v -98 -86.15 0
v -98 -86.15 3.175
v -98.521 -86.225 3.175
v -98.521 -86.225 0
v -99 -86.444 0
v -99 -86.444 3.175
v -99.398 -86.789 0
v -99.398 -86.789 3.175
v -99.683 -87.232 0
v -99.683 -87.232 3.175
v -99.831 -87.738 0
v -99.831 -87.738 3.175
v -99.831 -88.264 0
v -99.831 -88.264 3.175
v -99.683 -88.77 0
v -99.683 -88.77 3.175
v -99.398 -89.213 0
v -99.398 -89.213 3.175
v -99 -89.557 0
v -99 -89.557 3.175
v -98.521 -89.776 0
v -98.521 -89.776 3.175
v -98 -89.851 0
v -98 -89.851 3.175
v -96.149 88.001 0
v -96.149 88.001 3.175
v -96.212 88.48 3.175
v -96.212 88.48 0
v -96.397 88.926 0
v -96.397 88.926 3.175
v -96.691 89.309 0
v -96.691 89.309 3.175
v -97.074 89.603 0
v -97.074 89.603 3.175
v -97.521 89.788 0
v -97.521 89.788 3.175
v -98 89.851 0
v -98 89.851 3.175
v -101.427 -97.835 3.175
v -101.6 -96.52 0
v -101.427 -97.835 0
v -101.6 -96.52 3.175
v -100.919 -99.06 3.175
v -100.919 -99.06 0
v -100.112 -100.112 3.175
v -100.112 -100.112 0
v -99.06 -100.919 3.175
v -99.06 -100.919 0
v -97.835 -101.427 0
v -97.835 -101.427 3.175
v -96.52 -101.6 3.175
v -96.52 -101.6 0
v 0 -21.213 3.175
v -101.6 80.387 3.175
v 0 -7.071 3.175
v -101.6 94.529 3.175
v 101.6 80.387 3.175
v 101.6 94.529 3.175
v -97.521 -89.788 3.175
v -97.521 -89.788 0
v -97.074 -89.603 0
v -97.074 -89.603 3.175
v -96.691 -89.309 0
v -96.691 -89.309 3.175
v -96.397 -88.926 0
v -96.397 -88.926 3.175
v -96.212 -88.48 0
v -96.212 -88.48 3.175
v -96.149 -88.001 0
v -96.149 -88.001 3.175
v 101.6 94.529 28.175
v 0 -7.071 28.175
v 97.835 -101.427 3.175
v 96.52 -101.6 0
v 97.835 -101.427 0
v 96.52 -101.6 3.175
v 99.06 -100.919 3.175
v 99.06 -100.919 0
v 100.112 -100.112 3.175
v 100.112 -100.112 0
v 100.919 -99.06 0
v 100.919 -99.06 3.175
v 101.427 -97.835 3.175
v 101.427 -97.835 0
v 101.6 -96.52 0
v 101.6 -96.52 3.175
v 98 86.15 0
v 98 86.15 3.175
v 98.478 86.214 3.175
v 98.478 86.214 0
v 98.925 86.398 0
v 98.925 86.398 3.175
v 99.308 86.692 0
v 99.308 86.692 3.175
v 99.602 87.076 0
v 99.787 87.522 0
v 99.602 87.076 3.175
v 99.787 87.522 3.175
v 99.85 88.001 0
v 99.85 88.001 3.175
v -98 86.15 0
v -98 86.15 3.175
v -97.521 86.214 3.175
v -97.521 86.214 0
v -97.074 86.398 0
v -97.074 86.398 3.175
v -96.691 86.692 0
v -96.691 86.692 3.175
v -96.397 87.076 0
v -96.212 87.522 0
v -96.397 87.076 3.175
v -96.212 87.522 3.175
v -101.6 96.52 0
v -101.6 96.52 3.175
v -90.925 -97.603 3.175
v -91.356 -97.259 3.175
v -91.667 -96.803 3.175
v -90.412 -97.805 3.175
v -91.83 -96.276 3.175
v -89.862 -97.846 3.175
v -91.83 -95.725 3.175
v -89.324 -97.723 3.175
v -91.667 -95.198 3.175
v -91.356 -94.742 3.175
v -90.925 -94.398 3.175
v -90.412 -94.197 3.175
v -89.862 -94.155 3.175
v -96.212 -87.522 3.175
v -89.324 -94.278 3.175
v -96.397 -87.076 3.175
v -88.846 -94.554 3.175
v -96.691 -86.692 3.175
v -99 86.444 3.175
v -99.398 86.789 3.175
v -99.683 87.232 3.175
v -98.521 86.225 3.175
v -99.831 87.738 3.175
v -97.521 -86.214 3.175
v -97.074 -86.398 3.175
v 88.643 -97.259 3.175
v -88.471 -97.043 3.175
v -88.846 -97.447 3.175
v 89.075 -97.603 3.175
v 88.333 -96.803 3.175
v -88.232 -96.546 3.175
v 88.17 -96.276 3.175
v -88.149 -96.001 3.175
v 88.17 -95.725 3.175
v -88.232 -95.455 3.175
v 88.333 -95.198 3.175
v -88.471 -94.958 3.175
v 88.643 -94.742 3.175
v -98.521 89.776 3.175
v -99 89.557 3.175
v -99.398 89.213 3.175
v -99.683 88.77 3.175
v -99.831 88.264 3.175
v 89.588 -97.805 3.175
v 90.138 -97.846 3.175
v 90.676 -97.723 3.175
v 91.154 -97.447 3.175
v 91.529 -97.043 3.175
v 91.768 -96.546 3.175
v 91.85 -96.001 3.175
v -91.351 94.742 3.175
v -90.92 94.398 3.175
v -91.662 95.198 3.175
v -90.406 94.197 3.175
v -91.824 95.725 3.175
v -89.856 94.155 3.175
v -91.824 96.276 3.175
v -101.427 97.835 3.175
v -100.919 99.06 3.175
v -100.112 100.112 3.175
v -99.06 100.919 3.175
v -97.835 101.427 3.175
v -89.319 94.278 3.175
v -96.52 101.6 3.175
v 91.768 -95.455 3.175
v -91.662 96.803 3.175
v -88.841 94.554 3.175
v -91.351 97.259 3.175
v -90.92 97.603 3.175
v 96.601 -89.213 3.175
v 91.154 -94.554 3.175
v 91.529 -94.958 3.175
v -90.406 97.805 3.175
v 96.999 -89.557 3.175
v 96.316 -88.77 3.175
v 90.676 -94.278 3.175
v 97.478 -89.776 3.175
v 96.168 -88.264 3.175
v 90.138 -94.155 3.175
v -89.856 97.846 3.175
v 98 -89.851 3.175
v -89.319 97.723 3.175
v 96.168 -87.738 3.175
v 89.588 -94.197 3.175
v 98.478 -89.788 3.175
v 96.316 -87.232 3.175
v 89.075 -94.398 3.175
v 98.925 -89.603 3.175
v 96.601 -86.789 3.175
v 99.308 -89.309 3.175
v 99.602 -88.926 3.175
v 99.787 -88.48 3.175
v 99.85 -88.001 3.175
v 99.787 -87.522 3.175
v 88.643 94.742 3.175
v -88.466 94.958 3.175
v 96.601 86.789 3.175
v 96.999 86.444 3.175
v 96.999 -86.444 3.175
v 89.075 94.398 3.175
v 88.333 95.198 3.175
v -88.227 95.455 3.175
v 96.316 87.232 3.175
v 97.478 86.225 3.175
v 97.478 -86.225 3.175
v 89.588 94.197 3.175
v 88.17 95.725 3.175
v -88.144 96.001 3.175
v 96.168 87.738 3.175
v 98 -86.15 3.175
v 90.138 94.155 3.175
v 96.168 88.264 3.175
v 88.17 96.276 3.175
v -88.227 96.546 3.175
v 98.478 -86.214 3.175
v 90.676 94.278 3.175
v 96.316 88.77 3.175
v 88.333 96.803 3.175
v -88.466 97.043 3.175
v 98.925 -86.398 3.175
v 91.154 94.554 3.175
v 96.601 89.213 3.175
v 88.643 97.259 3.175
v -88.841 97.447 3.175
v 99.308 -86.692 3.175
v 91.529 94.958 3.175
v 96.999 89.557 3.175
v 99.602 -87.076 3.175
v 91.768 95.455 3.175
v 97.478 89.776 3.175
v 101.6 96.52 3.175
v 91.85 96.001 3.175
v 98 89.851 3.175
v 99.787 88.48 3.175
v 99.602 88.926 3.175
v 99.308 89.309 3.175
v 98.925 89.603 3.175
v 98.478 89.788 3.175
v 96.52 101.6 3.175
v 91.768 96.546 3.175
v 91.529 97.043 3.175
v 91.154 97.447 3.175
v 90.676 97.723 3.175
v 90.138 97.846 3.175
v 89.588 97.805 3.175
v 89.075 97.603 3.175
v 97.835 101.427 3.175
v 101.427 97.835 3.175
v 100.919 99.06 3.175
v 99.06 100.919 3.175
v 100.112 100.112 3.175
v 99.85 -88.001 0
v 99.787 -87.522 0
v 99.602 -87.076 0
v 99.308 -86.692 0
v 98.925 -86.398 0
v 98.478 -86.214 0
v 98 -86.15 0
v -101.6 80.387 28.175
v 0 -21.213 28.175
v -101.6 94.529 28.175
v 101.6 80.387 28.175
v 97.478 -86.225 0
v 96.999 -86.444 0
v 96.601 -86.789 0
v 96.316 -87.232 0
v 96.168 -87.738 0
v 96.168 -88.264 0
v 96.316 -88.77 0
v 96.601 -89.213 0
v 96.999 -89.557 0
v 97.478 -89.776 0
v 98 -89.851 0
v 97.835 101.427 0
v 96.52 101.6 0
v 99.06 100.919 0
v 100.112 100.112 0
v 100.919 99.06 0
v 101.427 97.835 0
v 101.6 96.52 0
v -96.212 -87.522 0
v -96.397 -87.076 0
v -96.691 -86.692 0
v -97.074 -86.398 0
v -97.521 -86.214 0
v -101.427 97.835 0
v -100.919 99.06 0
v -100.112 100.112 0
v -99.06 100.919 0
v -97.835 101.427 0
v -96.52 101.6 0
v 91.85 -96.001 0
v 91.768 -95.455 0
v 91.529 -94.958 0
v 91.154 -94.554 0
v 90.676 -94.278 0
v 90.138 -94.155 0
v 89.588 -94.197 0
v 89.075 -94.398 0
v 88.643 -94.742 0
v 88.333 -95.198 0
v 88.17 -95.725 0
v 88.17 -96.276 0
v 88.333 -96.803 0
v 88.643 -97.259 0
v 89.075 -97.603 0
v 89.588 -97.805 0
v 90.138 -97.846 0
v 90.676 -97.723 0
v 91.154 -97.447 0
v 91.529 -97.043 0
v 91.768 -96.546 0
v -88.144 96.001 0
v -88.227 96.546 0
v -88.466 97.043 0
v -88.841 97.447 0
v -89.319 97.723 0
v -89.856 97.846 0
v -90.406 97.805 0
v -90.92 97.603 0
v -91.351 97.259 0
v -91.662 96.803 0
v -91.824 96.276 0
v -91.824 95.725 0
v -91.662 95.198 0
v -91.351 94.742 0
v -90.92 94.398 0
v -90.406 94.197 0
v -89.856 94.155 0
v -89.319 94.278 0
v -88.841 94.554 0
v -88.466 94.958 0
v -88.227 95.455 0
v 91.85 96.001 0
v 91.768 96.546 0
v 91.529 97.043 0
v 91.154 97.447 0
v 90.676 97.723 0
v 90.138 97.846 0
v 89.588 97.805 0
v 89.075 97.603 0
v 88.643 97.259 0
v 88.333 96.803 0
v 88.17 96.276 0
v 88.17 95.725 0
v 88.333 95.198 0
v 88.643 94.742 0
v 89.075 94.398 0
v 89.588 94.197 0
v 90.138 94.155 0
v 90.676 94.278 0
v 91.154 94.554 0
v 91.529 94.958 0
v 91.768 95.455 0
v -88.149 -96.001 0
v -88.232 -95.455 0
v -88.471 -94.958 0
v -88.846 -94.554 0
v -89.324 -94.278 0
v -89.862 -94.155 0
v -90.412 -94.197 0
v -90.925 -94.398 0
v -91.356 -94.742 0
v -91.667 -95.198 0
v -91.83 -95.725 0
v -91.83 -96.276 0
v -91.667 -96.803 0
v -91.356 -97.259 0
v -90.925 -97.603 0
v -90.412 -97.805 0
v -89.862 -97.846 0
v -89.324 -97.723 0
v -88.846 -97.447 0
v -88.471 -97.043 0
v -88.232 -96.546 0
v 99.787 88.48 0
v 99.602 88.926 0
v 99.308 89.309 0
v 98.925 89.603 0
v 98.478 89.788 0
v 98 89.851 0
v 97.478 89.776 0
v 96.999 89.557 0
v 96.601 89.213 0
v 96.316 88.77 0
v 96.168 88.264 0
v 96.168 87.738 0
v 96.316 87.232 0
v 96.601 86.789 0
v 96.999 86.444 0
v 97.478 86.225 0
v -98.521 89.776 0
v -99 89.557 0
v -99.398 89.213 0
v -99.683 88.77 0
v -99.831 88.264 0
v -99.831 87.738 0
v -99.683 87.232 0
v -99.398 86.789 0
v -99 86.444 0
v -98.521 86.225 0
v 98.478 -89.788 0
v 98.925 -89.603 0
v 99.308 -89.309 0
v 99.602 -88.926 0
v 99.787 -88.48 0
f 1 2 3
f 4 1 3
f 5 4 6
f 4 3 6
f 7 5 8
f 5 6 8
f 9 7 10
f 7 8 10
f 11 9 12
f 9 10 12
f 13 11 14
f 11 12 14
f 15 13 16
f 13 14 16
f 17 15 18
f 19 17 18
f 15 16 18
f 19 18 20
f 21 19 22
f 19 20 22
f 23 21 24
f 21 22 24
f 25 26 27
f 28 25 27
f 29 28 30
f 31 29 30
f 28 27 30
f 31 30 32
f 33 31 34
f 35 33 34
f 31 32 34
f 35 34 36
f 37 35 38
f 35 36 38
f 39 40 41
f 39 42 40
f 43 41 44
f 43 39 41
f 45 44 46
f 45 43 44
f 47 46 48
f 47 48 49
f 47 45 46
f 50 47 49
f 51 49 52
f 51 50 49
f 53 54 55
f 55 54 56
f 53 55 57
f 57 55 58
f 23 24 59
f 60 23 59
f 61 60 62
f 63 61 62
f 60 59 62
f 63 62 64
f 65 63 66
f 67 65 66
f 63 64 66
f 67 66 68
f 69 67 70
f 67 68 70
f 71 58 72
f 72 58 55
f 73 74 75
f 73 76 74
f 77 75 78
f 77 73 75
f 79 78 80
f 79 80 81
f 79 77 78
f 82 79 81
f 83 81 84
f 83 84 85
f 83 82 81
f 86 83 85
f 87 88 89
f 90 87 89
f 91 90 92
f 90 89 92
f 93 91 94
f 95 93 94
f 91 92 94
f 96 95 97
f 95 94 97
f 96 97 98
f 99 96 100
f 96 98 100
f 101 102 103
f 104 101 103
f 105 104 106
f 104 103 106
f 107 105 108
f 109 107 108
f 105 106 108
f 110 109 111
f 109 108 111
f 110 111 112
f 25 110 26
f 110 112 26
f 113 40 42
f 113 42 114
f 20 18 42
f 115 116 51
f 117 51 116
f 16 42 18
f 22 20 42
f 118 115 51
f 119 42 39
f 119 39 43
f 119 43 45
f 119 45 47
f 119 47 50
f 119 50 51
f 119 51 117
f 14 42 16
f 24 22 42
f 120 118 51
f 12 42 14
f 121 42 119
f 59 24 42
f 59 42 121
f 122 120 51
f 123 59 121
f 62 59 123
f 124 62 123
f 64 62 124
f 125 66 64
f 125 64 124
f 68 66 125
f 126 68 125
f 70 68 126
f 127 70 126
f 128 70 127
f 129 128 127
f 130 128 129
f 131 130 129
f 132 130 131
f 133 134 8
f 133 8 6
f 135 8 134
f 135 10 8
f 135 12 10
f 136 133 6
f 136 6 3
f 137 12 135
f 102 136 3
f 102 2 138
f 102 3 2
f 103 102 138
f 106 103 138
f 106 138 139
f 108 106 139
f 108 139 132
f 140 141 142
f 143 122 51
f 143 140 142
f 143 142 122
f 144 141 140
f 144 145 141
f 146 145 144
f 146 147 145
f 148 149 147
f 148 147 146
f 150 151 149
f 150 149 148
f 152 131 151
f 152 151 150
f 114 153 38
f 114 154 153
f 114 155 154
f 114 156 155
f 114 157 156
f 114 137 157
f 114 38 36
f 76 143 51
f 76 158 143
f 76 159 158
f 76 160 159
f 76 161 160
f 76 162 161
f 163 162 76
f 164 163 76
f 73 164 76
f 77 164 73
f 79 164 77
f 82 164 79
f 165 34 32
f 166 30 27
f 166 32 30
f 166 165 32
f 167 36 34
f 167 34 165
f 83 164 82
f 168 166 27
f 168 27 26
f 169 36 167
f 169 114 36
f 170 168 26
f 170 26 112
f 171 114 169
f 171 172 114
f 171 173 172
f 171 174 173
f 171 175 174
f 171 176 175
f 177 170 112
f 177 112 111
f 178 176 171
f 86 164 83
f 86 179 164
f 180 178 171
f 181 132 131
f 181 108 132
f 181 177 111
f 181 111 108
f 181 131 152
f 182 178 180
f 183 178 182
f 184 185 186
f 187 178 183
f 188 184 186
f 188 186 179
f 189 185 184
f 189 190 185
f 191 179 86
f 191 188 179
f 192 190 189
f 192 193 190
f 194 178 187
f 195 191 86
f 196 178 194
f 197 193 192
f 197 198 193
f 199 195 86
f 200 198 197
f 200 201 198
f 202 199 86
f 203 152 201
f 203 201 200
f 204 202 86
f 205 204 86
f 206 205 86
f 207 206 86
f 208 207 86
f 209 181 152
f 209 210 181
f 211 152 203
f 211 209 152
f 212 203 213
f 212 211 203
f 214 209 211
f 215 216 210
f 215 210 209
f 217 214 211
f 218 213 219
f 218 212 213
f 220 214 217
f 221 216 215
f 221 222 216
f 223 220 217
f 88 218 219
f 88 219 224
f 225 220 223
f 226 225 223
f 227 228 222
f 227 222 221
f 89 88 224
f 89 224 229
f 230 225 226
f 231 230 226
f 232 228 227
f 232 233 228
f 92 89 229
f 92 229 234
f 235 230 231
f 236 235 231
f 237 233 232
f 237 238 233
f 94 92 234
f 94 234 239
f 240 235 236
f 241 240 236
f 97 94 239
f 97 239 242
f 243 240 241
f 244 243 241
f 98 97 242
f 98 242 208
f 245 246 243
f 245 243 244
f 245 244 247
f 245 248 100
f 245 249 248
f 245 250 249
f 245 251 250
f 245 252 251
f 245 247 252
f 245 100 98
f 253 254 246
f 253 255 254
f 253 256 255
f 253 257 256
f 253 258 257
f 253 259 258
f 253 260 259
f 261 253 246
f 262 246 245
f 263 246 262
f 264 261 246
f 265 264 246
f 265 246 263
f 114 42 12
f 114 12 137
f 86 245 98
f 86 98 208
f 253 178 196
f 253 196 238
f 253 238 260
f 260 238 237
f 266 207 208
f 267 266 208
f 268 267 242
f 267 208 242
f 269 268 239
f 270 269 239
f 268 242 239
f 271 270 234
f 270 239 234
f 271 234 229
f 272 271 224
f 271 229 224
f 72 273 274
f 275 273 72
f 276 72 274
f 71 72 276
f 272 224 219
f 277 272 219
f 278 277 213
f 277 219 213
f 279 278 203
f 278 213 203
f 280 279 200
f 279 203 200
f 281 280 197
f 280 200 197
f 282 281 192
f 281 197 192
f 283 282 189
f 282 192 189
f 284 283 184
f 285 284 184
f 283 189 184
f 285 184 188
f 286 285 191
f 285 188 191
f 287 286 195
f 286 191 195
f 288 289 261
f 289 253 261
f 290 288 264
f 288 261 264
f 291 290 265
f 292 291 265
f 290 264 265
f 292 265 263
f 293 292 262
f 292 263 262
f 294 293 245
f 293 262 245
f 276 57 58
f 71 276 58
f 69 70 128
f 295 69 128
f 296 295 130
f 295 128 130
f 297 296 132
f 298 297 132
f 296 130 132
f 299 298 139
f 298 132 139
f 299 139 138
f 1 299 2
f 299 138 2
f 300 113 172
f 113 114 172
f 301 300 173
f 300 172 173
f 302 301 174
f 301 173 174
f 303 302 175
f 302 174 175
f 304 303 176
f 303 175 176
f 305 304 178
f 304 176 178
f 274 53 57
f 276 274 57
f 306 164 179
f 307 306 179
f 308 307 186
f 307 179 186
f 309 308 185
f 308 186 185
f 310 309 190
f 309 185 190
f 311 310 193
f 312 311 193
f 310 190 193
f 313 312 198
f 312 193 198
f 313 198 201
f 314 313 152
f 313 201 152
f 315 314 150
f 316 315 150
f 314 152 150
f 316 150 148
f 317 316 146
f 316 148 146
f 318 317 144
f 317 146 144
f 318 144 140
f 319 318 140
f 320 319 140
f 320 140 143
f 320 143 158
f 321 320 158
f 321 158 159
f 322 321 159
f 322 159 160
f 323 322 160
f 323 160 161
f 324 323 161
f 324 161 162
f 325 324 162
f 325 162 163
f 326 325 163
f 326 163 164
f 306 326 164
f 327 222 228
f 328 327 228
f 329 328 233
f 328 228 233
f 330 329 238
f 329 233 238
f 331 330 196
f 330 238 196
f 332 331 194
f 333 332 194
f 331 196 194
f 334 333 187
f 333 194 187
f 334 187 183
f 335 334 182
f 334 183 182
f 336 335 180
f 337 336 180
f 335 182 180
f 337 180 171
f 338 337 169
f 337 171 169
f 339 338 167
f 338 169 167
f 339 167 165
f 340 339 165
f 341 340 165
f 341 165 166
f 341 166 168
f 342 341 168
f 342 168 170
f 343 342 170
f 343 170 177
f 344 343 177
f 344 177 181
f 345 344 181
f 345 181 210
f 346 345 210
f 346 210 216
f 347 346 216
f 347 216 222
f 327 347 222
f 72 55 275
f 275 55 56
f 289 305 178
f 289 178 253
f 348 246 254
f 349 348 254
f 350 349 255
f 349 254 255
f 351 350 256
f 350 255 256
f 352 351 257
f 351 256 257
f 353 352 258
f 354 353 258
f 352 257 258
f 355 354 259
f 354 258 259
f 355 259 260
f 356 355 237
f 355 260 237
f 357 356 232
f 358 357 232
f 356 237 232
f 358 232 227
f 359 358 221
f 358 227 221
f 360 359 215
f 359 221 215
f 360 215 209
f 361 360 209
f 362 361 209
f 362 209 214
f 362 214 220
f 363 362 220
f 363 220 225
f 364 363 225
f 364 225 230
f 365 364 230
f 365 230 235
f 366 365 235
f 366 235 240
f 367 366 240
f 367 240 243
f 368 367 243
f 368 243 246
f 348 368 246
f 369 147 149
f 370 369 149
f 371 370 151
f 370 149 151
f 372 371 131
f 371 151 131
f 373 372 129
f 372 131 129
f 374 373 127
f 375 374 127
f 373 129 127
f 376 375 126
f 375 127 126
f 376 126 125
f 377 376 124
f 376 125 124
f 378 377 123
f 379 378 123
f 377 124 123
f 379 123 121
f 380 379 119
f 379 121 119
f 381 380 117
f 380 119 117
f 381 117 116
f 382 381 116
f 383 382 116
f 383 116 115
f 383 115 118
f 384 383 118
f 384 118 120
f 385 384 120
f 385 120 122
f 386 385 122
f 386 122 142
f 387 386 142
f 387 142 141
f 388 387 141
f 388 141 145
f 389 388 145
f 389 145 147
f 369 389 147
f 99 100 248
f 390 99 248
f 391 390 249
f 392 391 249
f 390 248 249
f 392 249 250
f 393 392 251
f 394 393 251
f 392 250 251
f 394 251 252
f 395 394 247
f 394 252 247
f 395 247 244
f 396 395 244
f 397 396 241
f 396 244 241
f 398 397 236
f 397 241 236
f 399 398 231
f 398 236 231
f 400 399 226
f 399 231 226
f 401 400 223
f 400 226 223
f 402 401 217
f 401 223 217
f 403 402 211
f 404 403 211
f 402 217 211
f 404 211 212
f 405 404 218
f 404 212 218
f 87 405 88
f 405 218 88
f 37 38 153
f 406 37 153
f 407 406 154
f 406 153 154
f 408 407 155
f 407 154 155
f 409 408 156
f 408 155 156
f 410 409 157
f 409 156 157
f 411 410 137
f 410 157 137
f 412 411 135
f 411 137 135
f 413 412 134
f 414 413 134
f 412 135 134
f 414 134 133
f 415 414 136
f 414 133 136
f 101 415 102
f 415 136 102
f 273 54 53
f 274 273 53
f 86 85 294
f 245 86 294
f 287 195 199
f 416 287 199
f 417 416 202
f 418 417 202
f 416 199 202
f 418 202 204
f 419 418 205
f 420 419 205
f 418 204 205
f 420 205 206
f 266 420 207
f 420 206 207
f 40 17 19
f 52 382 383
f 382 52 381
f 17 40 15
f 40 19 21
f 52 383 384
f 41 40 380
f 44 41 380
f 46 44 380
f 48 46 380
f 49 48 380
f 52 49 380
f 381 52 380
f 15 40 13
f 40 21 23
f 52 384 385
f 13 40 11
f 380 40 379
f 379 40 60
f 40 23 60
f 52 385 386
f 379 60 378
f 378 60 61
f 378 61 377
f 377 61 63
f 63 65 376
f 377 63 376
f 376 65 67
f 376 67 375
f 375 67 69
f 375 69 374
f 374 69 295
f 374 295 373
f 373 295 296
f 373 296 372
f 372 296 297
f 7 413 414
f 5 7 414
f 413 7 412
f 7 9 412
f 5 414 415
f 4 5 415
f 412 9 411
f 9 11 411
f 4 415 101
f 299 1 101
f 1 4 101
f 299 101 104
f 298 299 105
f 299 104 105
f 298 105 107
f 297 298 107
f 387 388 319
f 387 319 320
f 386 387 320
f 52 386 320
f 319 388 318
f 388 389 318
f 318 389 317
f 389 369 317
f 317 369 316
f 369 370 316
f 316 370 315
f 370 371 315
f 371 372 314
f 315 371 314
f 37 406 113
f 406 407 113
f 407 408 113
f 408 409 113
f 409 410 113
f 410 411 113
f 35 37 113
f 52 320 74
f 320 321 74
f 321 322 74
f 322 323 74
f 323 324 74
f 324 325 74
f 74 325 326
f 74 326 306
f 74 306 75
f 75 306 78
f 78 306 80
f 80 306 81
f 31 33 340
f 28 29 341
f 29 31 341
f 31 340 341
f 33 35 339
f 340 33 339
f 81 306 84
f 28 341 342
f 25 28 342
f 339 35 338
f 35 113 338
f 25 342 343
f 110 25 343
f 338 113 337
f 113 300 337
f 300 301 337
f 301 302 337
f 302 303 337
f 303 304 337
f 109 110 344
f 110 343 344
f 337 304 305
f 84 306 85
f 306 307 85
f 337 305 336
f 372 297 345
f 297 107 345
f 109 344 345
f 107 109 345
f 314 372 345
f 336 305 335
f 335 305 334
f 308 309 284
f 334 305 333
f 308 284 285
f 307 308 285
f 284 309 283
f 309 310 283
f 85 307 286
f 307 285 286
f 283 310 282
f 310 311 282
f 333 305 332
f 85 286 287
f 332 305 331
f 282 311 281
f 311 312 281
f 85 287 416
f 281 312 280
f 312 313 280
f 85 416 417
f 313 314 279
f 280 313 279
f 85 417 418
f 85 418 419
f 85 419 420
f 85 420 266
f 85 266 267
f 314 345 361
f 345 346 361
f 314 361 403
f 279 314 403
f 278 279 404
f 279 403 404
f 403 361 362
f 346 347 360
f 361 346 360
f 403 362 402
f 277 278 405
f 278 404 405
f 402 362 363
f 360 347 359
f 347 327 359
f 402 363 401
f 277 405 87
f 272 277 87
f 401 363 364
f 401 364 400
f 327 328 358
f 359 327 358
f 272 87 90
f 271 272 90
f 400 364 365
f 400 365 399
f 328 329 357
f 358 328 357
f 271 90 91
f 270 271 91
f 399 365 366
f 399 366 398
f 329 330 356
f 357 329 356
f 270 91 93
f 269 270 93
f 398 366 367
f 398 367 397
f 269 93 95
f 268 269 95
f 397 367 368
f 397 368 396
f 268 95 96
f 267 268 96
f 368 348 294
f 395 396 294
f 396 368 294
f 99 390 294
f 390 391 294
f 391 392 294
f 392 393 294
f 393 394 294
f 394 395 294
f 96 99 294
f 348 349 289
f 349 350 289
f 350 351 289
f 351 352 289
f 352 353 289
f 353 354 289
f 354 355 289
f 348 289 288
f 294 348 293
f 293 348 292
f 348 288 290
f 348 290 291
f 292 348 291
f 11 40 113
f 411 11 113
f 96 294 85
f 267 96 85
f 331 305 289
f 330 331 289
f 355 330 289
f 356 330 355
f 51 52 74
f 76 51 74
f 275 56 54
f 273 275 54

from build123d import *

# Parameters (mm, degrees)
F0_W     = 203.2
F0_H     = 203.2
F1_DEPTH = 3.175
F2_R     = 1.85039
F3_DEPTH = 25.4
F4_R     = 5.08
F5_R     = 5.08
F7_DEPTH = 25


with BuildPart() as f1:
    # F0 (on Top) → F1 (new body)
    with BuildSketch(Plane.XY):
        Rectangle(F0_W, F0_H)
    extrude(amount=F1_DEPTH)

    # F2 (on face) → F3 (cut)
    with BuildSketch(Plane.XY.offset(3.175)):
        with BuildLine():
            ThreePointArc((97.99955, 89.85123), (96.14916, 88.00084), (97.99955, 86.15045))
            Line((97.99955, 86.15045), (97.99955, 89.85123))
        make_face()
        with BuildLine():
            Line((97.99955, 89.85123), (97.99955, 86.15045))
            ThreePointArc((97.99955, 86.15045), (99.307973, 86.692417), (99.84994, 88.00084))
            ThreePointArc((99.84994, 88.00084), (99.307973, 89.309263), (97.99955, 89.85123))
        make_face()
        with BuildLine():
            ThreePointArc((99.84994, -88.00084), (99.307973, -86.692417), (97.99955, -86.15045))
            Line((97.99955, -86.15045), (97.99955, -89.85123))
            ThreePointArc((97.99955, -89.85123), (99.307973, -89.309263), (99.84994, -88.00084))
        make_face()
        with BuildLine():
            Line((97.99955, -89.85123), (97.99955, -86.15045))
            ThreePointArc((97.99955, -86.15045), (96.14916, -88.00084), (97.99955, -89.85123))
        make_face()
        with BuildLine():
            ThreePointArc((-96.14916, -88.00084), (-96.691127, -86.692417), (-97.99955, -86.15045))
            Line((-97.99955, -86.15045), (-97.99955, -89.85123))
            ThreePointArc((-97.99955, -89.85123), (-96.691127, -89.309263), (-96.14916, -88.00084))
        make_face()
        with BuildLine():
            Line((-97.99955, -89.85123), (-97.99955, -86.15045))
            ThreePointArc((-97.99955, -86.15045), (-99.84994, -88.00084), (-97.99955, -89.85123))
        make_face()
        with BuildLine():
            ThreePointArc((-97.99955, 89.85123), (-99.84994, 88.00084), (-97.99955, 86.15045))
            Line((-97.99955, 86.15045), (-97.99955, 89.85123))
        make_face()
        with BuildLine():
            Line((-97.99955, 89.85123), (-97.99955, 86.15045))
            ThreePointArc((-97.99955, 86.15045), (-96.691127, 86.692417), (-96.14916, 88.00084))
            ThreePointArc((-96.14916, 88.00084), (-96.691127, 89.309263), (-97.99955, 89.85123))
        make_face()
        with Locations((-89.99474, 96.00057)):
            Circle(F2_R)
        with Locations((89.99982, 96.00057)):
            Circle(F2_R)
        with Locations((89.99982, -96.00057)):
            Circle(F2_R)
        with Locations((-89.99982, -96.00057)):
            Circle(F2_R)
    extrude(amount=-F3_DEPTH, mode=Mode.SUBTRACT)

    # F4
    f4_edges = [f1.edges().sort_by_distance(p)[0] for p in [
        (-101.6, 101.6, 1.5875),
    ]]
    fillet(f4_edges, radius=F4_R)

    # F5
    f5_edges = [f1.edges().sort_by_distance(p)[0] for p in [
        (101.6, 101.6, 1.5875),
        (101.6, -101.6, 1.5875),
        (-101.6, -101.6, 1.5875),
    ]]
    fillet(f5_edges, radius=F5_R)


with BuildPart() as f7:
    # F6 (on face) → F7 (new body)
    with BuildSketch(Plane.XY.offset(3.175)):
        Polygon((0, -7.07107), (-101.6, 94.52893), (-101.6, 80.386794), (0, -21.213206), (7.071068, -14.142138), (52.932265, 31.719059), (101.6, 80.386794), (101.6, 94.52893), align=None)
    extrude(amount=F7_DEPTH)


solid = Compound([f1.part, f7.part])
